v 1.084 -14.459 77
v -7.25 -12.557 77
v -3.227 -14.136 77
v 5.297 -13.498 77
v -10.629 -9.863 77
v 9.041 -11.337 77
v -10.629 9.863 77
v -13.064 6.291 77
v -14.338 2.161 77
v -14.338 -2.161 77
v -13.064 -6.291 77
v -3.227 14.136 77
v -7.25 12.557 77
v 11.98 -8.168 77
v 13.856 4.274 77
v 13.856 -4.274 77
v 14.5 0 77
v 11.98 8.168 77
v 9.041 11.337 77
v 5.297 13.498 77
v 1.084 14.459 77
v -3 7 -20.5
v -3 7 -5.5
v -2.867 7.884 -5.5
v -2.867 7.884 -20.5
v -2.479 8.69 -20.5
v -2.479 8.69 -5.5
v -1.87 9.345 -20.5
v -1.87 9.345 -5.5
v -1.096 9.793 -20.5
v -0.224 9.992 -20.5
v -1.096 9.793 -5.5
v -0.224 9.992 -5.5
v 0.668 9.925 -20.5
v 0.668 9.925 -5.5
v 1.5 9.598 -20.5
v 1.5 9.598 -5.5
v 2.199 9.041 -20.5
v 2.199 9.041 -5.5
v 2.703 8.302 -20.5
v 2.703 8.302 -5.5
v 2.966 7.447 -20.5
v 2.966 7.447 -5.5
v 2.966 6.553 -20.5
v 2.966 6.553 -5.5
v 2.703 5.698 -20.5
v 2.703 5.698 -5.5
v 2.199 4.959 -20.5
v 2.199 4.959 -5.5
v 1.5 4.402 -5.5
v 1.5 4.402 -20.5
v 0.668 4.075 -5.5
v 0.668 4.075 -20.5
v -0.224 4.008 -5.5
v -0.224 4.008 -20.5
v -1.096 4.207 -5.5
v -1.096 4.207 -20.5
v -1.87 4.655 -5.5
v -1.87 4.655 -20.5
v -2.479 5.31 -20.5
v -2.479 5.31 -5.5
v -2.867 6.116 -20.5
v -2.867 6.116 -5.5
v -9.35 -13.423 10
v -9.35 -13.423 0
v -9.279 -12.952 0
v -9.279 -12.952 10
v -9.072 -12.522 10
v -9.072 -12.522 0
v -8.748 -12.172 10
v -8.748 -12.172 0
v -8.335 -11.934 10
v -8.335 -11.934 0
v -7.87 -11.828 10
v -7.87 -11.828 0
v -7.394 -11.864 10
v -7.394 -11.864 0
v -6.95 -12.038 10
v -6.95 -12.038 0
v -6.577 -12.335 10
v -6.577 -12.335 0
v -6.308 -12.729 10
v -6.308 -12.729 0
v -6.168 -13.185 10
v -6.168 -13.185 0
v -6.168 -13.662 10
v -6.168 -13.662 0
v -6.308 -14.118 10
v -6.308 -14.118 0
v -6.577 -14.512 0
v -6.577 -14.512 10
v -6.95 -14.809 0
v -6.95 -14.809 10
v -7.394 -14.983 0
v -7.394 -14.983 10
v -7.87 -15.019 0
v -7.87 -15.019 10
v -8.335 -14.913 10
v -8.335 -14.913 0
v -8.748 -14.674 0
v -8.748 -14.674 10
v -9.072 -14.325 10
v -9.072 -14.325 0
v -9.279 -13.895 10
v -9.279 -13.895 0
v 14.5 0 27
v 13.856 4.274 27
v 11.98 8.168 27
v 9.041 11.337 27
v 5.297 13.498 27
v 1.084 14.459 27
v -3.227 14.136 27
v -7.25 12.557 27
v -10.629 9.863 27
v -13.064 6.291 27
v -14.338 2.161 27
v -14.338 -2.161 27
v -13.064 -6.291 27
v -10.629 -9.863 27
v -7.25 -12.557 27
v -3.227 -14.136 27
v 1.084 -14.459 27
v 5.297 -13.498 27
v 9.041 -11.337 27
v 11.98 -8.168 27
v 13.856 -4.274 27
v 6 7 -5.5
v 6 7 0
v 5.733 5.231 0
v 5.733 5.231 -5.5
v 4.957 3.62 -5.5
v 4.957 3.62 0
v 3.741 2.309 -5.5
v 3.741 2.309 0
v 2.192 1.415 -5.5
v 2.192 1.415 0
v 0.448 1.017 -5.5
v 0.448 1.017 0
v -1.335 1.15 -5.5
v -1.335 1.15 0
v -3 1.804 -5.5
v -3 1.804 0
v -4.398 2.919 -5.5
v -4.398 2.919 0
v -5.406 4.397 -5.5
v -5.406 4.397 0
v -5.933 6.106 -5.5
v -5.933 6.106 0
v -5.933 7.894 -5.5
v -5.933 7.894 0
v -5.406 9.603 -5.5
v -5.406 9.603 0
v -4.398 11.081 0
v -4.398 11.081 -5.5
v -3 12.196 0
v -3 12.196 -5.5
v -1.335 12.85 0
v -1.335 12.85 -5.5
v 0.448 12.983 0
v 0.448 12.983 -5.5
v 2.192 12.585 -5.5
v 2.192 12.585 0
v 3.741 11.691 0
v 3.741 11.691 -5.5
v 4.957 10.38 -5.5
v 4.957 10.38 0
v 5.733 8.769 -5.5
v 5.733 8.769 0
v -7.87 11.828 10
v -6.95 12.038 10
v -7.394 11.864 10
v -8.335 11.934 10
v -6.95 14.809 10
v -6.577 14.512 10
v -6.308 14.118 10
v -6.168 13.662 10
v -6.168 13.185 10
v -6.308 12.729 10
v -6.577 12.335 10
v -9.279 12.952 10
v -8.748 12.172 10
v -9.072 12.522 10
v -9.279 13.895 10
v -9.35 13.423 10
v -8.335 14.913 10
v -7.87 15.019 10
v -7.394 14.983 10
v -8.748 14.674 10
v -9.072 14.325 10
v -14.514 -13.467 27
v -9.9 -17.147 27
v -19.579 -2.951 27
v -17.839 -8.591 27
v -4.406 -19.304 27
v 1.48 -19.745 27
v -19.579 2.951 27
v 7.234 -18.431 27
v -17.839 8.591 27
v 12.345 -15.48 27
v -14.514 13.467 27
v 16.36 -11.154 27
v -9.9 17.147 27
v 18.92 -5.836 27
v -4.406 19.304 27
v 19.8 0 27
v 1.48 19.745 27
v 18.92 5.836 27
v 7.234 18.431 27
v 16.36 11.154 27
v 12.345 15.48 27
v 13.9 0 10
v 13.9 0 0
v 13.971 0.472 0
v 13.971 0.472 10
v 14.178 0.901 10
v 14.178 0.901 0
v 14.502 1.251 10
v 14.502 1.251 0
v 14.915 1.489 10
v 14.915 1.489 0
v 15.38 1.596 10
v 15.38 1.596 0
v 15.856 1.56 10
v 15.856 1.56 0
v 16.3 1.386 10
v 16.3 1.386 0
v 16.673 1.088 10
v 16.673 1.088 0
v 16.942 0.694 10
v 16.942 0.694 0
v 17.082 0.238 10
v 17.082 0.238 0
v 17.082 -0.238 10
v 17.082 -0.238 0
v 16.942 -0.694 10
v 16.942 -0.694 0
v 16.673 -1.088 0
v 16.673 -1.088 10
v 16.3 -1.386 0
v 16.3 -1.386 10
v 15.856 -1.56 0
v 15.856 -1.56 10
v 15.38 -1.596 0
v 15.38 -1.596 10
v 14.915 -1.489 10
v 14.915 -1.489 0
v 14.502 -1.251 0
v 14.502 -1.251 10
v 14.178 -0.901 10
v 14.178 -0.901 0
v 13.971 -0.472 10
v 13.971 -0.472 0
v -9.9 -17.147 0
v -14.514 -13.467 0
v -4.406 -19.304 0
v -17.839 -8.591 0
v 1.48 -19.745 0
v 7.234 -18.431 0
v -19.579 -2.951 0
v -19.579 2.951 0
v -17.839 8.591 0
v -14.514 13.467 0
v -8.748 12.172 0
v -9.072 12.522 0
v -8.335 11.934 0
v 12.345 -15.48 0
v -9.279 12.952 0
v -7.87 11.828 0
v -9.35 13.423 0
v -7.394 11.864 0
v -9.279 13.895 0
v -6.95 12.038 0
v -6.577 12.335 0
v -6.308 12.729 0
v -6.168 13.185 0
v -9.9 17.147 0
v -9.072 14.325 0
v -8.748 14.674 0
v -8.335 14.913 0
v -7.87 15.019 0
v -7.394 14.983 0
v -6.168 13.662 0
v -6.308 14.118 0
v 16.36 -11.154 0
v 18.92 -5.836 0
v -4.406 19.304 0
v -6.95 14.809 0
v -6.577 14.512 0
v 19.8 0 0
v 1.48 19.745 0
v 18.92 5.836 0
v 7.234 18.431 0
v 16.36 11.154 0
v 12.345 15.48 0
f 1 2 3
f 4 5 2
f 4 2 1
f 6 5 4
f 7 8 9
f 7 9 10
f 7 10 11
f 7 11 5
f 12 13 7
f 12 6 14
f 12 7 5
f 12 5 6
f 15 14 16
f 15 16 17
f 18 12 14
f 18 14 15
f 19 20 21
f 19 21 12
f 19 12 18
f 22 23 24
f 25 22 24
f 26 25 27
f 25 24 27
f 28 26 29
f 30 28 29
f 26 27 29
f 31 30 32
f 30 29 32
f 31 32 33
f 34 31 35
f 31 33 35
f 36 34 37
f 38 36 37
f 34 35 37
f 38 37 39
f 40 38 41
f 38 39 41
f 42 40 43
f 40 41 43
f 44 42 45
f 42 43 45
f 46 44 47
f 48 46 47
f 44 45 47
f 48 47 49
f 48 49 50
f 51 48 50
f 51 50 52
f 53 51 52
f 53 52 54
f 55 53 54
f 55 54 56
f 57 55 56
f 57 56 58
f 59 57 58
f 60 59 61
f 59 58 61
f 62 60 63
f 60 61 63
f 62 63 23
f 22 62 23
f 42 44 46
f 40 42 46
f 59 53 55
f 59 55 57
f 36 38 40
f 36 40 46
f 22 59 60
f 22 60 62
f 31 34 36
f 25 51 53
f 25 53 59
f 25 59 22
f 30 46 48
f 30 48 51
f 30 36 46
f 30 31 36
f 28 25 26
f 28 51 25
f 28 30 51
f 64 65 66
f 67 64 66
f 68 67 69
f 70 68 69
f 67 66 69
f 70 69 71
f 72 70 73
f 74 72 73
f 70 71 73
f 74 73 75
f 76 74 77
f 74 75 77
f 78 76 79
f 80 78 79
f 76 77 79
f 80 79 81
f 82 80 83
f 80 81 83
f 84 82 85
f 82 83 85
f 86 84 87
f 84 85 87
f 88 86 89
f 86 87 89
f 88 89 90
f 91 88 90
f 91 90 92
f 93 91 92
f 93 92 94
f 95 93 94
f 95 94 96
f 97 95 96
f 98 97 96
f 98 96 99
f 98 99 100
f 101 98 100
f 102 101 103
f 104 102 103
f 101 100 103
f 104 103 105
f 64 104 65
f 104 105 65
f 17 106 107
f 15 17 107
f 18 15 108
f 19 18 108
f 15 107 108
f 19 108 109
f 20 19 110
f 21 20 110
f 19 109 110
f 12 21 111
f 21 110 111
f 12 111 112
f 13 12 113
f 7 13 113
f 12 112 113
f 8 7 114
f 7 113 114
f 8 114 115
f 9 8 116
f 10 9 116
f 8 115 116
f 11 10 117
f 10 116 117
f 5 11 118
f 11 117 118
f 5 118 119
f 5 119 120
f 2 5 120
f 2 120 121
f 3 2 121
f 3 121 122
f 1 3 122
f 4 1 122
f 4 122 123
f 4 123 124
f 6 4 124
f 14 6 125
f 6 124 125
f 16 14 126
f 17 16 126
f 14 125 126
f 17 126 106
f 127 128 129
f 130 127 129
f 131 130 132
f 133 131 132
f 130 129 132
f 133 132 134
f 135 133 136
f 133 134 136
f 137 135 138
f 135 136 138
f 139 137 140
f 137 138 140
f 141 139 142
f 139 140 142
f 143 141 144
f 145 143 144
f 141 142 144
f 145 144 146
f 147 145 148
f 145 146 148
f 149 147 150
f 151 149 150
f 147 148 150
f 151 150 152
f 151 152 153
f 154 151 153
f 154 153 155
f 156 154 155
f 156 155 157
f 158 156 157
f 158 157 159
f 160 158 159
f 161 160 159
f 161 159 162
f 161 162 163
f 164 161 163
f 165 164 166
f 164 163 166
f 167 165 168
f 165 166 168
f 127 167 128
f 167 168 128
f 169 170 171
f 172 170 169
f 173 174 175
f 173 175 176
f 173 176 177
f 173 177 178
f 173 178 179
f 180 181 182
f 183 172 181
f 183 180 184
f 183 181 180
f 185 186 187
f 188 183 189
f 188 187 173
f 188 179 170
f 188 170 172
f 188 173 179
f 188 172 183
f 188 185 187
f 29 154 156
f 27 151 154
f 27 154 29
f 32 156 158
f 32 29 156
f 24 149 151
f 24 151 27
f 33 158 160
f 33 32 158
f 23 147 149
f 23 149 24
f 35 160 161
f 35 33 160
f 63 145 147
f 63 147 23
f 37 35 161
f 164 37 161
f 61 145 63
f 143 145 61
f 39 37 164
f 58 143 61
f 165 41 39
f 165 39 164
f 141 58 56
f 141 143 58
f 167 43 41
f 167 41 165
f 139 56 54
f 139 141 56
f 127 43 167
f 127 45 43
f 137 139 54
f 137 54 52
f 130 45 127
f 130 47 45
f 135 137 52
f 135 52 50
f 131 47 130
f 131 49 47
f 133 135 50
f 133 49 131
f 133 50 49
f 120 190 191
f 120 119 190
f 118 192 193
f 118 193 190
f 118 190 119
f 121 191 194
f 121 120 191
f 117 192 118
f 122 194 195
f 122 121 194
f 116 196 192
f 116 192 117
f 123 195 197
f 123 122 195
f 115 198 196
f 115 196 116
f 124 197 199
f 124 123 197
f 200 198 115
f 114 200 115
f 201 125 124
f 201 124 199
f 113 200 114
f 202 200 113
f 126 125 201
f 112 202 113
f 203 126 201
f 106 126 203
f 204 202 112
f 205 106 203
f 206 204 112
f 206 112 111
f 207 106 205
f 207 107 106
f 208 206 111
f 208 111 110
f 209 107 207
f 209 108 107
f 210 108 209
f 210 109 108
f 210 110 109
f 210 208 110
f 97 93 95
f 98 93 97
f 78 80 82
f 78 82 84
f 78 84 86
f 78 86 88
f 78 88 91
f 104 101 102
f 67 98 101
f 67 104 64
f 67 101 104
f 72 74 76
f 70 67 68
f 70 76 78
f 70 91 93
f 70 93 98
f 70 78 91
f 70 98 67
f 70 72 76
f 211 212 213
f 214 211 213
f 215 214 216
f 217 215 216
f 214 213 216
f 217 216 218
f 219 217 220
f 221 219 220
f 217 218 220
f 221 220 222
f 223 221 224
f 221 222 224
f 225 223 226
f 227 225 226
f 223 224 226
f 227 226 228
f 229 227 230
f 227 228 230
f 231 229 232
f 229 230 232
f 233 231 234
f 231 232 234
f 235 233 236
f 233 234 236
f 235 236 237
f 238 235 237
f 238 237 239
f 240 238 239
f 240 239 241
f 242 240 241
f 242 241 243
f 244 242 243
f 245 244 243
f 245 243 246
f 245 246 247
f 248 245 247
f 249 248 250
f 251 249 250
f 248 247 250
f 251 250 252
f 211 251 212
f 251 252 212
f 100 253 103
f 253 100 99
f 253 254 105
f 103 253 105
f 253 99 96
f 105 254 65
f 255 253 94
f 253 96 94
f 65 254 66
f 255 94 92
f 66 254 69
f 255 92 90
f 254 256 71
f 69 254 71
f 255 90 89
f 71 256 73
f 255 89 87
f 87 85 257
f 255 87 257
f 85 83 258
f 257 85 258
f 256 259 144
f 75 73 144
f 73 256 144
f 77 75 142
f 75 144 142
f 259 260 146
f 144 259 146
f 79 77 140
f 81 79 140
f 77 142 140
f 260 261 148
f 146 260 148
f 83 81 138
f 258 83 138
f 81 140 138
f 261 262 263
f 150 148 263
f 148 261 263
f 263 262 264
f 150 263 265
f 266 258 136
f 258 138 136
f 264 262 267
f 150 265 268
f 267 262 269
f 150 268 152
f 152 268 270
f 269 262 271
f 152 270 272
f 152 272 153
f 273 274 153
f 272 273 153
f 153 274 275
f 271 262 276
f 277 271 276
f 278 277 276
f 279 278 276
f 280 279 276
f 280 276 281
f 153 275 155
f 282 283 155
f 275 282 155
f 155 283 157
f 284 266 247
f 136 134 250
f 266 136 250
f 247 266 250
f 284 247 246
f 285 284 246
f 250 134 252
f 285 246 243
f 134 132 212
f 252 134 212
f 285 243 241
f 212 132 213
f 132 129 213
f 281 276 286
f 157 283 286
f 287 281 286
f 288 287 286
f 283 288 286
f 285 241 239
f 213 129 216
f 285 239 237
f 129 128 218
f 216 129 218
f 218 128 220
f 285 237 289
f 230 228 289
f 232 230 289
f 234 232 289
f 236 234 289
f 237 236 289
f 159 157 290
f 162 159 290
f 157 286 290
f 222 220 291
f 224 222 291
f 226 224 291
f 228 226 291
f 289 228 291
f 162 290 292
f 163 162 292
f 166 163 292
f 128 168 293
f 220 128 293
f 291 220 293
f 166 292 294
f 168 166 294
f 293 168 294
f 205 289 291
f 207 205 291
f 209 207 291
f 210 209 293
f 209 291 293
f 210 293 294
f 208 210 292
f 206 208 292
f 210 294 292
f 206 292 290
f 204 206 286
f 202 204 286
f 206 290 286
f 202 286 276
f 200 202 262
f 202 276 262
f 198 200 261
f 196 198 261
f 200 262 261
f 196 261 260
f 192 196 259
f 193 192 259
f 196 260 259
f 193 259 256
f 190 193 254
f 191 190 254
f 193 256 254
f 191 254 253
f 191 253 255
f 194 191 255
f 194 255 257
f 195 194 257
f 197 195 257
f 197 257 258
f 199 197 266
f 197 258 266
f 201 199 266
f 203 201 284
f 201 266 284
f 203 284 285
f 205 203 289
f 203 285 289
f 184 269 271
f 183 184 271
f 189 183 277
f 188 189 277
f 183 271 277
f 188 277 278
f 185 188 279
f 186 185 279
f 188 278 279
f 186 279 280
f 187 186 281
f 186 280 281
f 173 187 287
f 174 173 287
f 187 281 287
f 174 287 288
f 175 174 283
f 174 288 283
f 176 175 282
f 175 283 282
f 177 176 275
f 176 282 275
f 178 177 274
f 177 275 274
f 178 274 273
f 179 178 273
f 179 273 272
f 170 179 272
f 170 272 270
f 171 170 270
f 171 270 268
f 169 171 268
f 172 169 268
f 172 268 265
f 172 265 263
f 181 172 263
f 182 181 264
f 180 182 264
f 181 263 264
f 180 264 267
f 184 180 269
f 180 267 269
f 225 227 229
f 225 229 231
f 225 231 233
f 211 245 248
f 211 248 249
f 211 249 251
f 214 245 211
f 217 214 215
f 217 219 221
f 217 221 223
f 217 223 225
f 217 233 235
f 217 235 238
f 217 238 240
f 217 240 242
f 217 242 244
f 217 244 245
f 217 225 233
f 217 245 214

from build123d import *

# Parameters (mm, degrees)
SKETCH2_R           = 19.8
BOSS_EXTRUDE1_DEPTH = 27
SKETCH3_R           = 14.5
BOSS_EXTRUDE2_DEPTH = 50
SKETCH5_R           = 1.6
CUT_EXTRUDE1_DEPTH  = 10
SKETCH6_R           = 6
BOSS_EXTRUDE3_DEPTH = 5.5
SKETCH7_R           = 3
BOSS_EXTRUDE4_DEPTH = 15


with BuildPart() as part:
    # Sketch2 → Boss-Extrude1 (new body)
    with BuildSketch(Plane.XY):
        Circle(SKETCH2_R)
    extrude(amount=BOSS_EXTRUDE1_DEPTH)

    # Sketch3 → Boss-Extrude2 (add)
    with BuildSketch(Plane.XY.offset(27)):
        Circle(SKETCH3_R)
    extrude(amount=BOSS_EXTRUDE2_DEPTH)

    # Sketch5 → Cut-Extrude1 (cut)
    with BuildSketch(Plane(origin=(0, 0, 0), x_dir=(-1, 0, 0), z_dir=(0, 0, -1))):
        with Locations((-15.5, 0)):
            Circle(SKETCH5_R)
        with Locations((7.75, 13.423393759)):
            Circle(SKETCH5_R)
        with Locations((7.75, -13.423393759)):
            Circle(SKETCH5_R)
    extrude(amount=-CUT_EXTRUDE1_DEPTH, mode=Mode.SUBTRACT)

    # Sketch6 → Boss-Extrude3 (add)
    with BuildSketch(Plane(origin=(0, 0, 0), x_dir=(-1, 0, 0), z_dir=(0, 0, -1))):
        with Locations(Location((0, 7, 0), (0, 0, 180))):
            Circle(SKETCH6_R)
    extrude(amount=BOSS_EXTRUDE3_DEPTH)

    # Sketch7 → Boss-Extrude4 (add)
    with BuildSketch(Plane(origin=(0, 0, -5.5), x_dir=(-1, 0, 0), z_dir=(0, 0, -1))):
        with Locations((0, 7)):
            Circle(SKETCH7_R)
    extrude(amount=BOSS_EXTRUDE4_DEPTH)


solid = part.part
